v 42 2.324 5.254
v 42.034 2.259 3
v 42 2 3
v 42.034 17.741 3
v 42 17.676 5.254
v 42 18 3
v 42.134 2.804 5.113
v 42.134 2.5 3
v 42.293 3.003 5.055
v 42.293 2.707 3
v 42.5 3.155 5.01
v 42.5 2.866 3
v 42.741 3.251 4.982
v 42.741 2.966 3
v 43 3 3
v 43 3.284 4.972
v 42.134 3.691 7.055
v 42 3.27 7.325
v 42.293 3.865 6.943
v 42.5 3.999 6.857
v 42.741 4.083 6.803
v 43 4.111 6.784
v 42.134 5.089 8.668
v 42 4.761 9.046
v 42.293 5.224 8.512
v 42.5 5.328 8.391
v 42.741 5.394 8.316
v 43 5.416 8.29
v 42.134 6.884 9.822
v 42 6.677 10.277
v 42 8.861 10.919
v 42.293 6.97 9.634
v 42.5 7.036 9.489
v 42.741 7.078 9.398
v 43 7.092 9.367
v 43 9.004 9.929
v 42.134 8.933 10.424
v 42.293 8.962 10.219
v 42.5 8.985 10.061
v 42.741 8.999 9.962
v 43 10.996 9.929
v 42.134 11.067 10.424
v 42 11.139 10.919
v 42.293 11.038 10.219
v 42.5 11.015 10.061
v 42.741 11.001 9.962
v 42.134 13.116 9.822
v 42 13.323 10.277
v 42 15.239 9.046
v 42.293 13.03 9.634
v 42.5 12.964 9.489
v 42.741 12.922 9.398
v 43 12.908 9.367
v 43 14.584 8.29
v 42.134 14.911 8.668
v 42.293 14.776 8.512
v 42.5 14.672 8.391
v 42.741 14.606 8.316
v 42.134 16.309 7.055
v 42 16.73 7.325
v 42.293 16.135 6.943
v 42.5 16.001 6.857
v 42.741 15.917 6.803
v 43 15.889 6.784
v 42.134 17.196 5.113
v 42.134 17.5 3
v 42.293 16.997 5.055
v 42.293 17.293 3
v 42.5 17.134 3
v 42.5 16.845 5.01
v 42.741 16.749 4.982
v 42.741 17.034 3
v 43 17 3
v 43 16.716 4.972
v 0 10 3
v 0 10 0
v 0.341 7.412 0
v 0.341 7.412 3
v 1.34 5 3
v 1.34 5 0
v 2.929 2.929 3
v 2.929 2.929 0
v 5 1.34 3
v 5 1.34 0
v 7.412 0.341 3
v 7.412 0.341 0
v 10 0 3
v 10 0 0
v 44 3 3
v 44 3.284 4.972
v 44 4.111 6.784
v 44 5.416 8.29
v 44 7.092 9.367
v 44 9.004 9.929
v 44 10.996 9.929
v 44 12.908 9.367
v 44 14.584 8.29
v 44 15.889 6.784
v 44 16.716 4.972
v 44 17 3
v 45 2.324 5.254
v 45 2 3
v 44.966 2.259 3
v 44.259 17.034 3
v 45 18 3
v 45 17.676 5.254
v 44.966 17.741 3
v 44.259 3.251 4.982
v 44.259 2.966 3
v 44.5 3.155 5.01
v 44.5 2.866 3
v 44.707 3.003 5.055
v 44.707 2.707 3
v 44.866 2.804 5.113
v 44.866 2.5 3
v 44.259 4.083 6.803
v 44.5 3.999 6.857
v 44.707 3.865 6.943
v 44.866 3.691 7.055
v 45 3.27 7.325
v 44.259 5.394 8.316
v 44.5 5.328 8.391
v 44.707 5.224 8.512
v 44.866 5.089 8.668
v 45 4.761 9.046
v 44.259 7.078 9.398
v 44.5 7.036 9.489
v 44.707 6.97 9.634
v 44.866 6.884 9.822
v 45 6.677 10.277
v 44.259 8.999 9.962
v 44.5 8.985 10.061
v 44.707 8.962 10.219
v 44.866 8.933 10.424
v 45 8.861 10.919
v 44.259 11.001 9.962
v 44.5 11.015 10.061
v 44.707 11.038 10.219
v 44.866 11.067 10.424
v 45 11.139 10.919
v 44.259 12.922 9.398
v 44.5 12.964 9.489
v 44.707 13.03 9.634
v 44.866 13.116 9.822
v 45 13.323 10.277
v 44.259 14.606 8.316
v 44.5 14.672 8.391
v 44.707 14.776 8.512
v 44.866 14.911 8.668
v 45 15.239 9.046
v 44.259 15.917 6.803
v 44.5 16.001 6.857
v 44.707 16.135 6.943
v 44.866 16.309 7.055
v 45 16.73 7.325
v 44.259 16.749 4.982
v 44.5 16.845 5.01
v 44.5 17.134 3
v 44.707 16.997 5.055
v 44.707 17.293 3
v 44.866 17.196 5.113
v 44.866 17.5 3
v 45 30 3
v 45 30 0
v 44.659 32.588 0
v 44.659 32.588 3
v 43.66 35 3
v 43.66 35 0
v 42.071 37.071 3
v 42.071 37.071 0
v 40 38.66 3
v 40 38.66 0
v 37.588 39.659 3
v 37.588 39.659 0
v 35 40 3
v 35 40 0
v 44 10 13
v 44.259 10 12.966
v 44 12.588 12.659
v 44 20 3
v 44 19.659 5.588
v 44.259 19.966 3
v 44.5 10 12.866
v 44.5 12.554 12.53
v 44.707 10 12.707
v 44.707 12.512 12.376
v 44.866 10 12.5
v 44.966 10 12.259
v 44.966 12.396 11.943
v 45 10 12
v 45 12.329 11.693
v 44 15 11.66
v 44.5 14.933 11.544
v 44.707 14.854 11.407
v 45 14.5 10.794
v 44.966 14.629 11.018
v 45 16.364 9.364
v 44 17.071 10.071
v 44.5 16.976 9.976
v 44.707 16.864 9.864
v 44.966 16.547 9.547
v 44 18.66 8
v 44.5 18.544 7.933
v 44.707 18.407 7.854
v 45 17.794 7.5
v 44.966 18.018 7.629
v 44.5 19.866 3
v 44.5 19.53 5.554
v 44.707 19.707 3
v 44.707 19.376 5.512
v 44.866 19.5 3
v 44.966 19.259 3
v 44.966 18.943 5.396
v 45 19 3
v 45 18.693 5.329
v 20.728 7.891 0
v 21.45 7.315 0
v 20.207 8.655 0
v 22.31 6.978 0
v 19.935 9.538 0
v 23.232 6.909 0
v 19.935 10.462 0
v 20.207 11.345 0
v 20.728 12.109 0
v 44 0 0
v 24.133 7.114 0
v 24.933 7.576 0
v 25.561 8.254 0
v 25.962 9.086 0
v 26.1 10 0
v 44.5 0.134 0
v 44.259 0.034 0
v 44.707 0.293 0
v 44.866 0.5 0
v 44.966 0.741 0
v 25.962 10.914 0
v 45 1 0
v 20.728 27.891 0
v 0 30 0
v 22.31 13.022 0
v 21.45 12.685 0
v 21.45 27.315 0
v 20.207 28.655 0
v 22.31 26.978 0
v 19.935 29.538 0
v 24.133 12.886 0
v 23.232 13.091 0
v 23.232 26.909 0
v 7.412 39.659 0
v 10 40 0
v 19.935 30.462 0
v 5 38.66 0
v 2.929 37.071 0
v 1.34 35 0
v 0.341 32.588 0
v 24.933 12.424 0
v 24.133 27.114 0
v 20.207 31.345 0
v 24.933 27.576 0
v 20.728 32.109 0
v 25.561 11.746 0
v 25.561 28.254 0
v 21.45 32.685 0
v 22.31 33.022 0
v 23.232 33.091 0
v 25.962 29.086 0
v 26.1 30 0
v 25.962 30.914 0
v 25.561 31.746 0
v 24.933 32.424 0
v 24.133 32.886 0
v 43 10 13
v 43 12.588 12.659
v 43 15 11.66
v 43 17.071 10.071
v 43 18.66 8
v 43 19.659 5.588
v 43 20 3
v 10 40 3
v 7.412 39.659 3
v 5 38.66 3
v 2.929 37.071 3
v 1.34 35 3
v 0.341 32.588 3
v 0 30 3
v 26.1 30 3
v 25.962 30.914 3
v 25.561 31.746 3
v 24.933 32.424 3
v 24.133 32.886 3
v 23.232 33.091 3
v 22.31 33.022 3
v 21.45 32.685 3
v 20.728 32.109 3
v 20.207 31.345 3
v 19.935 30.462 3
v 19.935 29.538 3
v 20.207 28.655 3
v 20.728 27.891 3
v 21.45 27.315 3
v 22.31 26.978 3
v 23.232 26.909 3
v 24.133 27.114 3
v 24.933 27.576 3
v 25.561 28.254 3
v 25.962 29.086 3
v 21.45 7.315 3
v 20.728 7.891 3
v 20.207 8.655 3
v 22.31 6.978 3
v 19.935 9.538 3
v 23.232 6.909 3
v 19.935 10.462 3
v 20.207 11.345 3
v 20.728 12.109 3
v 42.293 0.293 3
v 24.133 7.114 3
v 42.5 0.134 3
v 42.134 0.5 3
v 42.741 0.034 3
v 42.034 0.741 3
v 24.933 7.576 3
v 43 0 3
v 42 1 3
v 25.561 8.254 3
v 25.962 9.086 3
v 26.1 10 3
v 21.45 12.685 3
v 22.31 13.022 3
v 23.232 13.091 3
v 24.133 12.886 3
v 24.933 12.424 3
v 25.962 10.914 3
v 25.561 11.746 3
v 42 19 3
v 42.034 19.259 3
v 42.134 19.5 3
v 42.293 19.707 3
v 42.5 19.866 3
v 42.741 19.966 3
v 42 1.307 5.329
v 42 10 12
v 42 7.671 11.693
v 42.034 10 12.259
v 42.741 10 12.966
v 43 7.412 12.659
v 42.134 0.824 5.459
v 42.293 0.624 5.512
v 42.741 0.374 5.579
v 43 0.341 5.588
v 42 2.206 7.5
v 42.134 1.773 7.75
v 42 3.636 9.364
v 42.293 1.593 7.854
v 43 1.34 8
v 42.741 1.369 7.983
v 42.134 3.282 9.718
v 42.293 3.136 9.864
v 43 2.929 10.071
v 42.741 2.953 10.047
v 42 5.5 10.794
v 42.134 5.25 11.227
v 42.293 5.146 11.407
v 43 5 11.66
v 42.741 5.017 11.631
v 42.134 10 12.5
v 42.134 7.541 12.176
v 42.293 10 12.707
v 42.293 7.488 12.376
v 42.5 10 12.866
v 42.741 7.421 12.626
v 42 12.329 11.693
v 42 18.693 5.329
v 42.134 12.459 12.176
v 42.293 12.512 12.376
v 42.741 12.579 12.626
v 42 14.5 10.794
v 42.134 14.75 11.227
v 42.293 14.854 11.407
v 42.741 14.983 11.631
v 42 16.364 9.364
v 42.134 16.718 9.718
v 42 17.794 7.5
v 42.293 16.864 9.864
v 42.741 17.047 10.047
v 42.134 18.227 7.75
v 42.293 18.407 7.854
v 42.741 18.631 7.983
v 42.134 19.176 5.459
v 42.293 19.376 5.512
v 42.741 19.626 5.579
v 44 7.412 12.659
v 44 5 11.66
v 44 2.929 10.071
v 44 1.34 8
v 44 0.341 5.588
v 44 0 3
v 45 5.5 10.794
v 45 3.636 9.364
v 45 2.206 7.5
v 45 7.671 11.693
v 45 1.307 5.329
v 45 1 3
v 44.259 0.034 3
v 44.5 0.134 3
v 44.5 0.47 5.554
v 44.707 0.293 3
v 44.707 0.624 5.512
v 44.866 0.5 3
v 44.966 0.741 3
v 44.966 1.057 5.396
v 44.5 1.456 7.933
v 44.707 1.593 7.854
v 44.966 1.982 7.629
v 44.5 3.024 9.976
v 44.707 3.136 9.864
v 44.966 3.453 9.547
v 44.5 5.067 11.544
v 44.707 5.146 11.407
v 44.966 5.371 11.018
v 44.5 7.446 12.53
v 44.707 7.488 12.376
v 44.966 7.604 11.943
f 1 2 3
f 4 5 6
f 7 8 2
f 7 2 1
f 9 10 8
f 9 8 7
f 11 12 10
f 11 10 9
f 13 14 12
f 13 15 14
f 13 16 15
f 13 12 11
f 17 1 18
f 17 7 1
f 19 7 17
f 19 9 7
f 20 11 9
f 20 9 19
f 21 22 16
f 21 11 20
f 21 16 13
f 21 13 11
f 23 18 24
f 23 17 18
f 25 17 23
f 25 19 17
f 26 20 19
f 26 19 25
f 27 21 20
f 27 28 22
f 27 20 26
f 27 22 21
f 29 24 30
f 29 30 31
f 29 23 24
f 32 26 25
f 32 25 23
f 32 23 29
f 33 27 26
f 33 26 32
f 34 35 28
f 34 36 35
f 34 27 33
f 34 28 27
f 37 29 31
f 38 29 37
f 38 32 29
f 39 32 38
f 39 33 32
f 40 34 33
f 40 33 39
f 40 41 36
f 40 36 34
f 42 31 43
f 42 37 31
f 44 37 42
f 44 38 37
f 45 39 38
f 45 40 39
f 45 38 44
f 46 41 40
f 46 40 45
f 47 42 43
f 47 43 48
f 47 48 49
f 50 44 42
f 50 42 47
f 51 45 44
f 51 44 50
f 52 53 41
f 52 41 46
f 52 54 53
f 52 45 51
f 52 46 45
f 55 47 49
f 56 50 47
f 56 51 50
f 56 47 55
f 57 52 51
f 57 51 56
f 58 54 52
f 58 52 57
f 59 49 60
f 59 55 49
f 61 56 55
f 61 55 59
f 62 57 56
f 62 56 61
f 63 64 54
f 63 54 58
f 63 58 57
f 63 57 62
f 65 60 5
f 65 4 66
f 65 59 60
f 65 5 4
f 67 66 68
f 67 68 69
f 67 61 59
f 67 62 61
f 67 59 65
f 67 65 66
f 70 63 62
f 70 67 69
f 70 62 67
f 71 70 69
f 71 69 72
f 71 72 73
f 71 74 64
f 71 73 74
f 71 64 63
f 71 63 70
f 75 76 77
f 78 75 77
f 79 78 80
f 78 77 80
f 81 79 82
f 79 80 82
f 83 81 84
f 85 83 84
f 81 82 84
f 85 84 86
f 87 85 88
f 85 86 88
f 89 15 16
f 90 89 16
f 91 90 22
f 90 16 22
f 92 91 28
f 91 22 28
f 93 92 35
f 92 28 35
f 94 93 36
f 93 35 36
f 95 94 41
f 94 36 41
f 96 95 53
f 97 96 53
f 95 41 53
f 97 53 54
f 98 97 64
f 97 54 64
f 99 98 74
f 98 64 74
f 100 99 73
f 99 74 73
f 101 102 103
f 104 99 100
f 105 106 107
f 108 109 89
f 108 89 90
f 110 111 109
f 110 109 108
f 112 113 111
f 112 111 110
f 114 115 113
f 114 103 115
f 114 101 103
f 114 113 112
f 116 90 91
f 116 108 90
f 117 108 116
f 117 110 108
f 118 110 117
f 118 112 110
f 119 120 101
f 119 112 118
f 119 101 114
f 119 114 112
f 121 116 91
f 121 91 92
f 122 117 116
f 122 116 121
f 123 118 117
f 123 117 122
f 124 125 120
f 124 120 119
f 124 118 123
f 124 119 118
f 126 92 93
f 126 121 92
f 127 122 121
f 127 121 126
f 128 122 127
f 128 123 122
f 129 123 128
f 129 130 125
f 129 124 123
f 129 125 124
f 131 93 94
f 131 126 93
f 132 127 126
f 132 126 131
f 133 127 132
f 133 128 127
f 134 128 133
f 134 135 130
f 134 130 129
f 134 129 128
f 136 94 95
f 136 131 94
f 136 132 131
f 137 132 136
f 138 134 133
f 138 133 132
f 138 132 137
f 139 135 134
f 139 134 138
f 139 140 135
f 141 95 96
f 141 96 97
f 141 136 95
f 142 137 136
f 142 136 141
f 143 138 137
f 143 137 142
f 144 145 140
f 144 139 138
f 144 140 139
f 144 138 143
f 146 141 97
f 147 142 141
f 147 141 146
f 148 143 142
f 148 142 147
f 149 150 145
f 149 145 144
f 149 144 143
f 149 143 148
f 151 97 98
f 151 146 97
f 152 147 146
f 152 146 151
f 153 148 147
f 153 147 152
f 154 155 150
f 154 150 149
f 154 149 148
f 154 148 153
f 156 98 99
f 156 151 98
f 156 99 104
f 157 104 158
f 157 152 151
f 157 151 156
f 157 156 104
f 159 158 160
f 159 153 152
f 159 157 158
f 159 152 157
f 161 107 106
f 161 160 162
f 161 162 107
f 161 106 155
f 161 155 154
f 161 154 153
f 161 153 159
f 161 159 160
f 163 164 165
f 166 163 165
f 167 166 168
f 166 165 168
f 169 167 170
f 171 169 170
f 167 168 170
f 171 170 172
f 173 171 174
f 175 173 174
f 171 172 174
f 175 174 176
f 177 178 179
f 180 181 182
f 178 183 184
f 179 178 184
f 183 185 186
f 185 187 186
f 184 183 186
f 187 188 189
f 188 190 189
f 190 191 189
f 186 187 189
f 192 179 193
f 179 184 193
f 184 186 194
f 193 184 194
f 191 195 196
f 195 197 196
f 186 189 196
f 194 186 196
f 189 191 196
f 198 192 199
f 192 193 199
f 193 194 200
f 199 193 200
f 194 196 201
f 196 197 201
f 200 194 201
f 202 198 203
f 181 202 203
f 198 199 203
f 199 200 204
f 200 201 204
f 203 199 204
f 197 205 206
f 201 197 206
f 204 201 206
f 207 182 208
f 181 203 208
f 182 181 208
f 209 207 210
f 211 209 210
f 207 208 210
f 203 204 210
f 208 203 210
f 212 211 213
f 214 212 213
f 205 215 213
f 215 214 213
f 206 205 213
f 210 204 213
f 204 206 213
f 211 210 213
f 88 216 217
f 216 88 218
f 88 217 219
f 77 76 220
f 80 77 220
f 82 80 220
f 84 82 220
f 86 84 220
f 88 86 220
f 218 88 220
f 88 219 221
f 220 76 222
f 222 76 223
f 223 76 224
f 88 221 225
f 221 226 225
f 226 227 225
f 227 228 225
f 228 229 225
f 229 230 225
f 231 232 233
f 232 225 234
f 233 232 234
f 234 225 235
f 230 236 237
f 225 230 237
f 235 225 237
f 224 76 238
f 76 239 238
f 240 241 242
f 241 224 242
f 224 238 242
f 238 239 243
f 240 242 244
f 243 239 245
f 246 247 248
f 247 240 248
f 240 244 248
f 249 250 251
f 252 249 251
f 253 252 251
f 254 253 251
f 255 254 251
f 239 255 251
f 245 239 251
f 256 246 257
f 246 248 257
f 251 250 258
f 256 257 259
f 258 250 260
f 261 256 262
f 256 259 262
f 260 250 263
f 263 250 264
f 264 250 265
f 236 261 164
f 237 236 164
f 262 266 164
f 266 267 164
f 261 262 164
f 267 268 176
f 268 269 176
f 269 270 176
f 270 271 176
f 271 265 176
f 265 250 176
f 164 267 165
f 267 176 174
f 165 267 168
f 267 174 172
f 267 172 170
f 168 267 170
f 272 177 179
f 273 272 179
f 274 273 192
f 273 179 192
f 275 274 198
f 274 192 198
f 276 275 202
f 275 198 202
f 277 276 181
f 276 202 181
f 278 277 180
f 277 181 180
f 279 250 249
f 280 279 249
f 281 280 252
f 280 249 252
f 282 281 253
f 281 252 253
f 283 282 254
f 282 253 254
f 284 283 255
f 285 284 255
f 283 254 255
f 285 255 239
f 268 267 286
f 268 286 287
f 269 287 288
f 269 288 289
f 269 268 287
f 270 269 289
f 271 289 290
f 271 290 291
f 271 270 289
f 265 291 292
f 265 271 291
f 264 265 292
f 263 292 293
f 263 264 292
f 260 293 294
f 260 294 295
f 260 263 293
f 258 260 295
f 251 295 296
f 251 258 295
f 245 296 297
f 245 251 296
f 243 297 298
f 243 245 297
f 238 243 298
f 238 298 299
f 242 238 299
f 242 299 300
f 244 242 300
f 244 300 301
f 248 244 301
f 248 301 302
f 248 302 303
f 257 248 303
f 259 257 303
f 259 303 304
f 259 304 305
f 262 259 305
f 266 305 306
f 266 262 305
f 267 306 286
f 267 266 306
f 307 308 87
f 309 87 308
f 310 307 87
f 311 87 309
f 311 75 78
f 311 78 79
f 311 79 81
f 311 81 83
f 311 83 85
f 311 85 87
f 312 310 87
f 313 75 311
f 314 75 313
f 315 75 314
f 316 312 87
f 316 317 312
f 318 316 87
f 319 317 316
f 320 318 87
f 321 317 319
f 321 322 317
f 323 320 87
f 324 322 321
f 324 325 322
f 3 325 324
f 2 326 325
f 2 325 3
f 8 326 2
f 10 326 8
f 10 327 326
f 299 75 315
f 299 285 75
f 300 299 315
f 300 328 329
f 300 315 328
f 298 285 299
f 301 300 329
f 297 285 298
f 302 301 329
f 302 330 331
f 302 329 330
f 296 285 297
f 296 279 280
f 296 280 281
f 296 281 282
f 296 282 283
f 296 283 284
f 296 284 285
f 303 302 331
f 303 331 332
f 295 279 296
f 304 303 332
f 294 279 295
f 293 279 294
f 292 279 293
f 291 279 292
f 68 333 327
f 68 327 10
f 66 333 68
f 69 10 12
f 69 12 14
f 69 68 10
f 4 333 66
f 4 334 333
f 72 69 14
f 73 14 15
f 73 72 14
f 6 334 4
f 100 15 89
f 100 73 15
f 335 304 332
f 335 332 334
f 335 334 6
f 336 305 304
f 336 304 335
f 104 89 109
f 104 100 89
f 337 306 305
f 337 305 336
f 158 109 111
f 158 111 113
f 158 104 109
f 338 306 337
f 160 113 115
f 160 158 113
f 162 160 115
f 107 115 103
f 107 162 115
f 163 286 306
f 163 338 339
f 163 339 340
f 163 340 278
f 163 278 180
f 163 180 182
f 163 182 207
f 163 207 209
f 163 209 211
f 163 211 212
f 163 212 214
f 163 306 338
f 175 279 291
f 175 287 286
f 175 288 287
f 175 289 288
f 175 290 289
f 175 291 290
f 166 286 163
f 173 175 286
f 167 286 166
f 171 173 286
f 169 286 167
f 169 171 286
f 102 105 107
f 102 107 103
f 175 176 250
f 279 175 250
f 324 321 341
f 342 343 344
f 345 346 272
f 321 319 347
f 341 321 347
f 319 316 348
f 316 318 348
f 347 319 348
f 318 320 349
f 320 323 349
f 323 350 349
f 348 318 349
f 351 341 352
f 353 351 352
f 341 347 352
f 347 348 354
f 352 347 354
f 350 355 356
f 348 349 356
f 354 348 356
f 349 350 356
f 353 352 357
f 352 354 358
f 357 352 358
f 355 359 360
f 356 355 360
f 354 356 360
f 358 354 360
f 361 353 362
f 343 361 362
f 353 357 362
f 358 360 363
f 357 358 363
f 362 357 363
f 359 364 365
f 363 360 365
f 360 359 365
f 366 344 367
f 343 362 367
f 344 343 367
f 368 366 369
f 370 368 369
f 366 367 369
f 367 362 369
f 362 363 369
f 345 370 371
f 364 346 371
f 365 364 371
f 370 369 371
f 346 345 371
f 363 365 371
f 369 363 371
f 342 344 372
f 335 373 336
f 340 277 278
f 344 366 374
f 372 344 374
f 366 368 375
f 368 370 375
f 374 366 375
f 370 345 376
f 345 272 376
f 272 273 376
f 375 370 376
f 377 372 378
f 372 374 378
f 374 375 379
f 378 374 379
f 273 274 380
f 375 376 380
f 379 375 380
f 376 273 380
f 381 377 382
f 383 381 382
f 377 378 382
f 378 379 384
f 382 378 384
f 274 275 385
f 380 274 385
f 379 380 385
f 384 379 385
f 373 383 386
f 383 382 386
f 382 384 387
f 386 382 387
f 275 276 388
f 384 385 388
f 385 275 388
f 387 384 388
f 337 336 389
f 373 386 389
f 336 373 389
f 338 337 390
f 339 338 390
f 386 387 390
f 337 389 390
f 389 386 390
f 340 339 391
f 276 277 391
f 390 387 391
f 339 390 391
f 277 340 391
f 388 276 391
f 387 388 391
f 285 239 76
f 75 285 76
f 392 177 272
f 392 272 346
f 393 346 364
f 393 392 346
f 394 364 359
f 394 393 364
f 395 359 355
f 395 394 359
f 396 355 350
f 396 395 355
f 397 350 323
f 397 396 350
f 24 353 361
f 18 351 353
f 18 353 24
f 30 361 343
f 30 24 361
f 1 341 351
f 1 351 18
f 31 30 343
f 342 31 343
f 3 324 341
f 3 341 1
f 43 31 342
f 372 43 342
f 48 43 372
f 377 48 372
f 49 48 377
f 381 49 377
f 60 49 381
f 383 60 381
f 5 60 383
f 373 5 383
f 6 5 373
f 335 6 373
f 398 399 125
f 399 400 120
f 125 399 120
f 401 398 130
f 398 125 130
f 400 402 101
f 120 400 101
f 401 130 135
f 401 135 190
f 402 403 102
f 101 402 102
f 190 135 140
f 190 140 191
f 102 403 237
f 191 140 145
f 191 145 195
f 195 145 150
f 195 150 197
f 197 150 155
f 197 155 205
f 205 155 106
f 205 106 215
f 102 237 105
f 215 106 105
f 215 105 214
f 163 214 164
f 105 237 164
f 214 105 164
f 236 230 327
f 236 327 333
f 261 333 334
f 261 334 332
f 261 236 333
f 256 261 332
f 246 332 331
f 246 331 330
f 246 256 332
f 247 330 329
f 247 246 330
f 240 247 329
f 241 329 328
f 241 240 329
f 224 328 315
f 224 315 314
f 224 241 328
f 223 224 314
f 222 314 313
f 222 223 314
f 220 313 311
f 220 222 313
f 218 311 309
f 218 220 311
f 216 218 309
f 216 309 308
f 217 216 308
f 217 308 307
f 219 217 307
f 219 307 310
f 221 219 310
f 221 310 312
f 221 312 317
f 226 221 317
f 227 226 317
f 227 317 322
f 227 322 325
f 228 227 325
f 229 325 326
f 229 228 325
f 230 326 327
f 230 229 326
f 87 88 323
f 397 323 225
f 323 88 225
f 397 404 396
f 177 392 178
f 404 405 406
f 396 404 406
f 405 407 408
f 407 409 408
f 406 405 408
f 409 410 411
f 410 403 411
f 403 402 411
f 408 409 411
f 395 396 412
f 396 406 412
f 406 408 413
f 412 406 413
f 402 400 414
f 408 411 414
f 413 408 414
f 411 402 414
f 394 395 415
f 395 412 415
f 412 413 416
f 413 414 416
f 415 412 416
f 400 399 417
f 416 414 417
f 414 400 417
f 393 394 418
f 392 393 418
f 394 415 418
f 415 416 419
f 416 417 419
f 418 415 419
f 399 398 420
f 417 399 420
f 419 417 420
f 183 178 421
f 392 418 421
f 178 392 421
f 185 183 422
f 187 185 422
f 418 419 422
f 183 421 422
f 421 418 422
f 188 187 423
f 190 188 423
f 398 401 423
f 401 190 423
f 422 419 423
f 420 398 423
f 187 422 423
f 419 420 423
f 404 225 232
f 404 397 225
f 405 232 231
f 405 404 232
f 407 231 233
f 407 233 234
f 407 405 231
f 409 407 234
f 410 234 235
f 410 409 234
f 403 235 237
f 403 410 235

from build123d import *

# Parameters (mm, degrees)
SKETCH1_R           = 3.1
BOSS_EXTRUDE1_DEPTH = 3
SKETCH2_W           = 3
SKETCH2_H           = 20
BOSS_EXTRUDE2_DEPTH = 10
FILLET1_R           = 10
CUT_EXTRUDE1_DEPTH  = 60.439044407
FILLET2_R           = 1


with BuildPart() as part:
    # Sketch1 → Boss-Extrude1 (new body)
    with BuildSketch(Plane.XY):
        with BuildLine():
            Line((10, 0), (45, 0))
            Line((45, 0), (45, 30))
            ThreePointArc((45, 30), (42.071067812, 37.071067812), (35, 40))
            Line((35, 40), (10, 40))
            ThreePointArc((10, 40), (2.928932188, 37.071067812), (0, 30))
            Line((0, 30), (0, 10))
            ThreePointArc((0, 10), (2.928932188, 2.928932188), (10, 0))
        make_face()
        with Locations((23, 30)):
            Circle(SKETCH1_R, mode=Mode.SUBTRACT)
        with Locations((23, 10)):
            Circle(SKETCH1_R, mode=Mode.SUBTRACT)
    extrude(amount=BOSS_EXTRUDE1_DEPTH)

    # Sketch2 → Boss-Extrude2 (add)
    with BuildSketch(Plane.XY.offset(3)):
        with Locations((43.5, 10)):
            Rectangle(SKETCH2_W, SKETCH2_H)
    extrude(amount=BOSS_EXTRUDE2_DEPTH)

    # Fillet1
    fillet1_edges = [part.edges().sort_by_distance(p)[0] for p in [
        (43.5, 0, 13),
        (43.5, 20, 13),
    ]]
    fillet(fillet1_edges, radius=FILLET1_R - 0.0001)  # a hair under: the kernel refuses the full size

    # Sketch3 → Cut-Extrude1 (cut, through all)
    with BuildSketch(Plane.ZY.offset(-42)):
        with BuildLine():
            Line((3, 17), (3, 3))
            ThreePointArc((3, 3), (10, 10), (3, 17))
        make_face()
    extrude(amount=-CUT_EXTRUDE1_DEPTH, mode=Mode.SUBTRACT)

    # Fillet2
    fillet2_edges = [part.edges().sort_by_distance(p)[0] for p in [
        (45, 0, 1.50005),
        (45, 17.071097101, 10.071097101),
        (45, 2.928902899, 10.071097101),
        (42, 17.071097101, 10.071097101),
        (42, 2.928902899, 10.071097101),
        (45, 10, 10),
        (42, 10, 10),
    ]]
    fillet(fillet2_edges, radius=FILLET2_R)


solid = part.part
